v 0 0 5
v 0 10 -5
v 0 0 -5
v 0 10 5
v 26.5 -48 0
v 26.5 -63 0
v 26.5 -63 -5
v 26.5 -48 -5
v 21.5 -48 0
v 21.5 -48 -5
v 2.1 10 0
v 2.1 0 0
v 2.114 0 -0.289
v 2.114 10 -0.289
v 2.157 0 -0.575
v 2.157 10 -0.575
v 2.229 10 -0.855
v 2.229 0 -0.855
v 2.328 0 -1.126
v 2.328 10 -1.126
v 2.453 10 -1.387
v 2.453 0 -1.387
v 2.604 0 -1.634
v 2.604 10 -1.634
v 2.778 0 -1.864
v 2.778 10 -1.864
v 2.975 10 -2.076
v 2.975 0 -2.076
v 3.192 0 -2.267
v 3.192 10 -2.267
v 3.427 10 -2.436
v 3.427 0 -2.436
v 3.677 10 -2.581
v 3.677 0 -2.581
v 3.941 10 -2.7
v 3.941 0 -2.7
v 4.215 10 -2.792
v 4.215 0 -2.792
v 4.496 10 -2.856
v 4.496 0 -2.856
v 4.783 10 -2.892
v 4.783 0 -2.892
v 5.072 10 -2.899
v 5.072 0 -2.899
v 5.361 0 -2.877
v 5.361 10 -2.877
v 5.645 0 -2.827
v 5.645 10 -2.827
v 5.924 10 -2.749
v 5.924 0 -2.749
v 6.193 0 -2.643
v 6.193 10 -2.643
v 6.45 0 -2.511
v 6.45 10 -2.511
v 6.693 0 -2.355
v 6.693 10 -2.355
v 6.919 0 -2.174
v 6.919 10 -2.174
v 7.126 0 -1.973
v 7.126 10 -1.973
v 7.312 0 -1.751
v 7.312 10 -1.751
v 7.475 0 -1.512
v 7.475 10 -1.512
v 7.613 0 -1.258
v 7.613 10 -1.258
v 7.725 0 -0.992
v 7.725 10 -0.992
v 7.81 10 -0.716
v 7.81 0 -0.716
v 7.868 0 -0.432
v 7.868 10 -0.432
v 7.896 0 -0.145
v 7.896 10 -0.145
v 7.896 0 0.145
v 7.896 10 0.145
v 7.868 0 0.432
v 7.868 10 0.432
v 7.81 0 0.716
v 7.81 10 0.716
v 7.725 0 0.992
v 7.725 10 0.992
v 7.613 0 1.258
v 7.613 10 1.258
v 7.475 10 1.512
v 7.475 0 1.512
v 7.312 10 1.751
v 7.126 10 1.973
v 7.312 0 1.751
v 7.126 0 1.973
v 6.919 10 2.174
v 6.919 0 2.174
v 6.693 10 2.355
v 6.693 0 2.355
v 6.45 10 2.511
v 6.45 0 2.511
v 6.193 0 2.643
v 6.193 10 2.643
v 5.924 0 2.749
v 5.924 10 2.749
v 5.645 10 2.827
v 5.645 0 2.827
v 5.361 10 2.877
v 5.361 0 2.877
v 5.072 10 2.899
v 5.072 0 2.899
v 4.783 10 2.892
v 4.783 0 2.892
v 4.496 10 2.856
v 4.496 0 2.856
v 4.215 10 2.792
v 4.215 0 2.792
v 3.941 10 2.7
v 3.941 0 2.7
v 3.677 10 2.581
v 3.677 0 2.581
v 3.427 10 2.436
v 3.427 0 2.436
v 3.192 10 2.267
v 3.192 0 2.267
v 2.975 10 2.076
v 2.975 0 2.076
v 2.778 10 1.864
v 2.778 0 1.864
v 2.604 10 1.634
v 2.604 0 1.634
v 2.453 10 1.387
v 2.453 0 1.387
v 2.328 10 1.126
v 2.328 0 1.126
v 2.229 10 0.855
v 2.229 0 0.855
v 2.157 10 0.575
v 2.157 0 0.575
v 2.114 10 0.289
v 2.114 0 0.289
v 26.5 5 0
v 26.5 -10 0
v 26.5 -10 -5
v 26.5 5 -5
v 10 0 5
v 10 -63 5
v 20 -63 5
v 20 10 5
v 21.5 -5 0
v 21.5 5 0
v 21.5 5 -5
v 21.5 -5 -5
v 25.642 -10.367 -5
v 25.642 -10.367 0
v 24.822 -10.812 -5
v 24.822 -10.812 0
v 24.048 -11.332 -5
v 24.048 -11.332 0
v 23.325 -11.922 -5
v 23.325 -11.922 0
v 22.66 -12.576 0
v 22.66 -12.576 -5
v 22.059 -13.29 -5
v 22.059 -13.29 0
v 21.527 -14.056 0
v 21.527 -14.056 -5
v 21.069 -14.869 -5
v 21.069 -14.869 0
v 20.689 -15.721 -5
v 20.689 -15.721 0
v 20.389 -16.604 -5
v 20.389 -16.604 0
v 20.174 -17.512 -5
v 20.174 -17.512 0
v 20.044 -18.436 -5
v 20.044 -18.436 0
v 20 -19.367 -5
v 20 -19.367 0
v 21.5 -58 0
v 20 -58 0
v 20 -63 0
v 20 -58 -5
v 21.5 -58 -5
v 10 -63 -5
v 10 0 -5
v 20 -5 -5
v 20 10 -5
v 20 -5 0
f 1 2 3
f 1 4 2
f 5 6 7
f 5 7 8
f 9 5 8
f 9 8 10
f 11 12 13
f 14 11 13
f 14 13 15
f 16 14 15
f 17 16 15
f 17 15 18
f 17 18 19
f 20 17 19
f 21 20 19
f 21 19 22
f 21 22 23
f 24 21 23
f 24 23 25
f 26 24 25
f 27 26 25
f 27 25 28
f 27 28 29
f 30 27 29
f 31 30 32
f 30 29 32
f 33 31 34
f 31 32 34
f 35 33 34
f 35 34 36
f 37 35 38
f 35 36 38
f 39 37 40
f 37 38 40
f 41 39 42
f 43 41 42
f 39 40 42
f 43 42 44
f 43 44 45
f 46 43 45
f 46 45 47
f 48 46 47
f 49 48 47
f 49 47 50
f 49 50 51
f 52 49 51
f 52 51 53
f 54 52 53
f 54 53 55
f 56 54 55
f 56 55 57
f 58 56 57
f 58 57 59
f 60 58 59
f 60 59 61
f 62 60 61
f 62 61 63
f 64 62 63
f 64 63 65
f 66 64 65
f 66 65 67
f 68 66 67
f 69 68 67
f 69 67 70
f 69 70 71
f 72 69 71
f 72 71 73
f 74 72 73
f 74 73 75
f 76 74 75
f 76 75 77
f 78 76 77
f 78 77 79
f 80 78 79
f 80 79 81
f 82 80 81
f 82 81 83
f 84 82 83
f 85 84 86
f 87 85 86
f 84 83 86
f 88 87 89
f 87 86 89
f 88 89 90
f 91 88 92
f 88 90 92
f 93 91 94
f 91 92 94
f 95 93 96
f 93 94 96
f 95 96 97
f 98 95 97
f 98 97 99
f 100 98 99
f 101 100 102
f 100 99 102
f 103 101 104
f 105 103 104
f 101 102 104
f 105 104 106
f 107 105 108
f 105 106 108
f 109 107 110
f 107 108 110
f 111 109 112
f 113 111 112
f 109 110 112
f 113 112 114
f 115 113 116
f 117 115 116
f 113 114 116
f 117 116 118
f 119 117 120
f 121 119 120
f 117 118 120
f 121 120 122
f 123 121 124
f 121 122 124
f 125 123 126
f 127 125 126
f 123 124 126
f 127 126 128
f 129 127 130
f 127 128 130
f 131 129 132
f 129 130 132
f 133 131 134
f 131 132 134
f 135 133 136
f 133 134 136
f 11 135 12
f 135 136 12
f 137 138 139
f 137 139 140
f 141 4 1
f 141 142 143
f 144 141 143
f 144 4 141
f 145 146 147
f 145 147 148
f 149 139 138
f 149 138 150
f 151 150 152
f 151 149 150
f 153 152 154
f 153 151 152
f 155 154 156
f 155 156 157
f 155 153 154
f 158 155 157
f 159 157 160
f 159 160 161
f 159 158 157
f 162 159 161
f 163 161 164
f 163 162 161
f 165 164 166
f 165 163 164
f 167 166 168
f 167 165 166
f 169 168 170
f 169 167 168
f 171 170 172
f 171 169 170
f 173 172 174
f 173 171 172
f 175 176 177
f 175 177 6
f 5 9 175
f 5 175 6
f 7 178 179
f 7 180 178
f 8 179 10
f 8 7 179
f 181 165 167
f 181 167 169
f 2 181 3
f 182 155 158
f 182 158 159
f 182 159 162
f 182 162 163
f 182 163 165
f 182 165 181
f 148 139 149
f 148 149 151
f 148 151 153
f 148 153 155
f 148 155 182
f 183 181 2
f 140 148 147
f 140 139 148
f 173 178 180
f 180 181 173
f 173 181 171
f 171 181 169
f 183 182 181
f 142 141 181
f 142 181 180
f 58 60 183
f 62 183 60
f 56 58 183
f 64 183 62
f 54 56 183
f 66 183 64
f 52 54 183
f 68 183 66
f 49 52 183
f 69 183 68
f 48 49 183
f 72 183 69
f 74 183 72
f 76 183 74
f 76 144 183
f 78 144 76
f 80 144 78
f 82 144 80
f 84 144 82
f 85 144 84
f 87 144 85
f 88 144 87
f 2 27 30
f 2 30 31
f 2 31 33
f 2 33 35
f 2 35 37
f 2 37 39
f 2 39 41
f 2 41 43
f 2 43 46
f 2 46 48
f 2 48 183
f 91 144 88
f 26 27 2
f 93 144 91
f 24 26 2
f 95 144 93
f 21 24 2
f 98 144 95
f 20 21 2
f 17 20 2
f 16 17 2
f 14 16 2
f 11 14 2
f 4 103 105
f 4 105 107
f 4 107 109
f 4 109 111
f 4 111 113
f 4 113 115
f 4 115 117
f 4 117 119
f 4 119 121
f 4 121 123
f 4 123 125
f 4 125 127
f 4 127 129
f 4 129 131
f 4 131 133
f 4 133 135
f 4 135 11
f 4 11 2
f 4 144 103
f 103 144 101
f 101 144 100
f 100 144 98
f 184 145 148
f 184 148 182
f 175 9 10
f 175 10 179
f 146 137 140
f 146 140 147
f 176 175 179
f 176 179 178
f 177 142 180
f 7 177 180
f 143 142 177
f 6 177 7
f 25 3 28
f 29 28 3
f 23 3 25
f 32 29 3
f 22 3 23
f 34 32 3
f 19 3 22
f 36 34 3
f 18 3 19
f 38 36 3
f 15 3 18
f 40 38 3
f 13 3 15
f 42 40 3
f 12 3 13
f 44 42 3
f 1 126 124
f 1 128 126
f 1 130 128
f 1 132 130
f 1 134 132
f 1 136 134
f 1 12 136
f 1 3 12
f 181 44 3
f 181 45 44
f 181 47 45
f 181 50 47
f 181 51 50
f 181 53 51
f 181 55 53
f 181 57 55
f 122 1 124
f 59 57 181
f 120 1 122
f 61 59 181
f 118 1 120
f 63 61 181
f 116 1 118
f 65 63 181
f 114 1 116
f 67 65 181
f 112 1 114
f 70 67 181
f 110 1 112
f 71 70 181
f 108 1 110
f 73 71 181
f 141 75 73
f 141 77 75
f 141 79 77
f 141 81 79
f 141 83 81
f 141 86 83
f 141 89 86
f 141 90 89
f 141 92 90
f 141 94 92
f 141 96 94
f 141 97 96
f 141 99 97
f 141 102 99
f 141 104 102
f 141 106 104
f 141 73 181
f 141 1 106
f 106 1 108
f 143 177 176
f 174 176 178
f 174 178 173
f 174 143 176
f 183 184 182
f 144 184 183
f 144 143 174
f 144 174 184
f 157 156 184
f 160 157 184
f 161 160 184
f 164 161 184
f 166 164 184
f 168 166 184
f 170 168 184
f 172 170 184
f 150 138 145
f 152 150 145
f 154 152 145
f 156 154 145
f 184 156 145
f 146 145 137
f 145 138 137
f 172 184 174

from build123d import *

# Parameters (mm, degrees)
BOSS_EXTRUDE1_DEPTH  = 5
SKETCH2_W            = 6.5
SKETCH2_H            = 5
CUT_EXTRUDE1_DEPTH   = 74.152238517
FILLET1_R            = 10
M5_CLEARANCE_HOLE1_D = 5.8


with BuildPart() as part:
    # Sketch1 → Boss-Extrude1 (new, symmetric)
    with BuildSketch(Plane.XY):
        Polygon((0, 0), (10, 0), (10, -63), (26.5, -63), (26.5, -48), (21.5, -48), (21.5, -58), (20, -58), (20, -10), (26.5, -10), (26.5, 5), (21.5, 5), (21.5, -5), (20, -5), (20, 10), (0, 10), align=None)
    extrude(amount=BOSS_EXTRUDE1_DEPTH, both=True)

    # Sketch2 → Cut-Extrude1 (cut, through all)
    with BuildSketch(Plane(origin=(0, 5, 0), x_dir=(1, 0, 0), z_dir=(0, 1, 0))):
        with Locations((23.25, -2.5)):
            Rectangle(SKETCH2_W, SKETCH2_H)
    extrude(amount=-CUT_EXTRUDE1_DEPTH, mode=Mode.SUBTRACT)

    # Fillet1
    # the kernel refuses this fillet: 10 mm, written as the material it adds along each edge
    with BuildSketch(Plane(origin=(20, -10, -5), x_dir=(0, -1, 0), z_dir=(0, 0, 1))) as fillet1_piece_1:
        with BuildLine():
            CenterArc((9.367496998, 10), FILLET1_R, 200.487315115, 69.512684885)
            Line((0, 6.5), (-0.18734994, 6.43))
            ThreePointArc((-0.18734994, 6.43), (-0.2, 3.25), (-0.2, 0))
            Line((-0.2, 0), (0, -0.2))
            Line((0, -0.2), (9.367496998, -0.2))
            Line((9.367496998, -0.2), (9.367496998, 0))
        make_face()
    extrude(amount=5)

    # M5 Clearance Hole1 (through all)
    with Locations(Plane(origin=(0, 10, 0), x_dir=(1, 0, 0), z_dir=(0, 1, 0))):
        with Locations((5, 0)):
            Hole(M5_CLEARANCE_HOLE1_D / 2)


solid = part.part
